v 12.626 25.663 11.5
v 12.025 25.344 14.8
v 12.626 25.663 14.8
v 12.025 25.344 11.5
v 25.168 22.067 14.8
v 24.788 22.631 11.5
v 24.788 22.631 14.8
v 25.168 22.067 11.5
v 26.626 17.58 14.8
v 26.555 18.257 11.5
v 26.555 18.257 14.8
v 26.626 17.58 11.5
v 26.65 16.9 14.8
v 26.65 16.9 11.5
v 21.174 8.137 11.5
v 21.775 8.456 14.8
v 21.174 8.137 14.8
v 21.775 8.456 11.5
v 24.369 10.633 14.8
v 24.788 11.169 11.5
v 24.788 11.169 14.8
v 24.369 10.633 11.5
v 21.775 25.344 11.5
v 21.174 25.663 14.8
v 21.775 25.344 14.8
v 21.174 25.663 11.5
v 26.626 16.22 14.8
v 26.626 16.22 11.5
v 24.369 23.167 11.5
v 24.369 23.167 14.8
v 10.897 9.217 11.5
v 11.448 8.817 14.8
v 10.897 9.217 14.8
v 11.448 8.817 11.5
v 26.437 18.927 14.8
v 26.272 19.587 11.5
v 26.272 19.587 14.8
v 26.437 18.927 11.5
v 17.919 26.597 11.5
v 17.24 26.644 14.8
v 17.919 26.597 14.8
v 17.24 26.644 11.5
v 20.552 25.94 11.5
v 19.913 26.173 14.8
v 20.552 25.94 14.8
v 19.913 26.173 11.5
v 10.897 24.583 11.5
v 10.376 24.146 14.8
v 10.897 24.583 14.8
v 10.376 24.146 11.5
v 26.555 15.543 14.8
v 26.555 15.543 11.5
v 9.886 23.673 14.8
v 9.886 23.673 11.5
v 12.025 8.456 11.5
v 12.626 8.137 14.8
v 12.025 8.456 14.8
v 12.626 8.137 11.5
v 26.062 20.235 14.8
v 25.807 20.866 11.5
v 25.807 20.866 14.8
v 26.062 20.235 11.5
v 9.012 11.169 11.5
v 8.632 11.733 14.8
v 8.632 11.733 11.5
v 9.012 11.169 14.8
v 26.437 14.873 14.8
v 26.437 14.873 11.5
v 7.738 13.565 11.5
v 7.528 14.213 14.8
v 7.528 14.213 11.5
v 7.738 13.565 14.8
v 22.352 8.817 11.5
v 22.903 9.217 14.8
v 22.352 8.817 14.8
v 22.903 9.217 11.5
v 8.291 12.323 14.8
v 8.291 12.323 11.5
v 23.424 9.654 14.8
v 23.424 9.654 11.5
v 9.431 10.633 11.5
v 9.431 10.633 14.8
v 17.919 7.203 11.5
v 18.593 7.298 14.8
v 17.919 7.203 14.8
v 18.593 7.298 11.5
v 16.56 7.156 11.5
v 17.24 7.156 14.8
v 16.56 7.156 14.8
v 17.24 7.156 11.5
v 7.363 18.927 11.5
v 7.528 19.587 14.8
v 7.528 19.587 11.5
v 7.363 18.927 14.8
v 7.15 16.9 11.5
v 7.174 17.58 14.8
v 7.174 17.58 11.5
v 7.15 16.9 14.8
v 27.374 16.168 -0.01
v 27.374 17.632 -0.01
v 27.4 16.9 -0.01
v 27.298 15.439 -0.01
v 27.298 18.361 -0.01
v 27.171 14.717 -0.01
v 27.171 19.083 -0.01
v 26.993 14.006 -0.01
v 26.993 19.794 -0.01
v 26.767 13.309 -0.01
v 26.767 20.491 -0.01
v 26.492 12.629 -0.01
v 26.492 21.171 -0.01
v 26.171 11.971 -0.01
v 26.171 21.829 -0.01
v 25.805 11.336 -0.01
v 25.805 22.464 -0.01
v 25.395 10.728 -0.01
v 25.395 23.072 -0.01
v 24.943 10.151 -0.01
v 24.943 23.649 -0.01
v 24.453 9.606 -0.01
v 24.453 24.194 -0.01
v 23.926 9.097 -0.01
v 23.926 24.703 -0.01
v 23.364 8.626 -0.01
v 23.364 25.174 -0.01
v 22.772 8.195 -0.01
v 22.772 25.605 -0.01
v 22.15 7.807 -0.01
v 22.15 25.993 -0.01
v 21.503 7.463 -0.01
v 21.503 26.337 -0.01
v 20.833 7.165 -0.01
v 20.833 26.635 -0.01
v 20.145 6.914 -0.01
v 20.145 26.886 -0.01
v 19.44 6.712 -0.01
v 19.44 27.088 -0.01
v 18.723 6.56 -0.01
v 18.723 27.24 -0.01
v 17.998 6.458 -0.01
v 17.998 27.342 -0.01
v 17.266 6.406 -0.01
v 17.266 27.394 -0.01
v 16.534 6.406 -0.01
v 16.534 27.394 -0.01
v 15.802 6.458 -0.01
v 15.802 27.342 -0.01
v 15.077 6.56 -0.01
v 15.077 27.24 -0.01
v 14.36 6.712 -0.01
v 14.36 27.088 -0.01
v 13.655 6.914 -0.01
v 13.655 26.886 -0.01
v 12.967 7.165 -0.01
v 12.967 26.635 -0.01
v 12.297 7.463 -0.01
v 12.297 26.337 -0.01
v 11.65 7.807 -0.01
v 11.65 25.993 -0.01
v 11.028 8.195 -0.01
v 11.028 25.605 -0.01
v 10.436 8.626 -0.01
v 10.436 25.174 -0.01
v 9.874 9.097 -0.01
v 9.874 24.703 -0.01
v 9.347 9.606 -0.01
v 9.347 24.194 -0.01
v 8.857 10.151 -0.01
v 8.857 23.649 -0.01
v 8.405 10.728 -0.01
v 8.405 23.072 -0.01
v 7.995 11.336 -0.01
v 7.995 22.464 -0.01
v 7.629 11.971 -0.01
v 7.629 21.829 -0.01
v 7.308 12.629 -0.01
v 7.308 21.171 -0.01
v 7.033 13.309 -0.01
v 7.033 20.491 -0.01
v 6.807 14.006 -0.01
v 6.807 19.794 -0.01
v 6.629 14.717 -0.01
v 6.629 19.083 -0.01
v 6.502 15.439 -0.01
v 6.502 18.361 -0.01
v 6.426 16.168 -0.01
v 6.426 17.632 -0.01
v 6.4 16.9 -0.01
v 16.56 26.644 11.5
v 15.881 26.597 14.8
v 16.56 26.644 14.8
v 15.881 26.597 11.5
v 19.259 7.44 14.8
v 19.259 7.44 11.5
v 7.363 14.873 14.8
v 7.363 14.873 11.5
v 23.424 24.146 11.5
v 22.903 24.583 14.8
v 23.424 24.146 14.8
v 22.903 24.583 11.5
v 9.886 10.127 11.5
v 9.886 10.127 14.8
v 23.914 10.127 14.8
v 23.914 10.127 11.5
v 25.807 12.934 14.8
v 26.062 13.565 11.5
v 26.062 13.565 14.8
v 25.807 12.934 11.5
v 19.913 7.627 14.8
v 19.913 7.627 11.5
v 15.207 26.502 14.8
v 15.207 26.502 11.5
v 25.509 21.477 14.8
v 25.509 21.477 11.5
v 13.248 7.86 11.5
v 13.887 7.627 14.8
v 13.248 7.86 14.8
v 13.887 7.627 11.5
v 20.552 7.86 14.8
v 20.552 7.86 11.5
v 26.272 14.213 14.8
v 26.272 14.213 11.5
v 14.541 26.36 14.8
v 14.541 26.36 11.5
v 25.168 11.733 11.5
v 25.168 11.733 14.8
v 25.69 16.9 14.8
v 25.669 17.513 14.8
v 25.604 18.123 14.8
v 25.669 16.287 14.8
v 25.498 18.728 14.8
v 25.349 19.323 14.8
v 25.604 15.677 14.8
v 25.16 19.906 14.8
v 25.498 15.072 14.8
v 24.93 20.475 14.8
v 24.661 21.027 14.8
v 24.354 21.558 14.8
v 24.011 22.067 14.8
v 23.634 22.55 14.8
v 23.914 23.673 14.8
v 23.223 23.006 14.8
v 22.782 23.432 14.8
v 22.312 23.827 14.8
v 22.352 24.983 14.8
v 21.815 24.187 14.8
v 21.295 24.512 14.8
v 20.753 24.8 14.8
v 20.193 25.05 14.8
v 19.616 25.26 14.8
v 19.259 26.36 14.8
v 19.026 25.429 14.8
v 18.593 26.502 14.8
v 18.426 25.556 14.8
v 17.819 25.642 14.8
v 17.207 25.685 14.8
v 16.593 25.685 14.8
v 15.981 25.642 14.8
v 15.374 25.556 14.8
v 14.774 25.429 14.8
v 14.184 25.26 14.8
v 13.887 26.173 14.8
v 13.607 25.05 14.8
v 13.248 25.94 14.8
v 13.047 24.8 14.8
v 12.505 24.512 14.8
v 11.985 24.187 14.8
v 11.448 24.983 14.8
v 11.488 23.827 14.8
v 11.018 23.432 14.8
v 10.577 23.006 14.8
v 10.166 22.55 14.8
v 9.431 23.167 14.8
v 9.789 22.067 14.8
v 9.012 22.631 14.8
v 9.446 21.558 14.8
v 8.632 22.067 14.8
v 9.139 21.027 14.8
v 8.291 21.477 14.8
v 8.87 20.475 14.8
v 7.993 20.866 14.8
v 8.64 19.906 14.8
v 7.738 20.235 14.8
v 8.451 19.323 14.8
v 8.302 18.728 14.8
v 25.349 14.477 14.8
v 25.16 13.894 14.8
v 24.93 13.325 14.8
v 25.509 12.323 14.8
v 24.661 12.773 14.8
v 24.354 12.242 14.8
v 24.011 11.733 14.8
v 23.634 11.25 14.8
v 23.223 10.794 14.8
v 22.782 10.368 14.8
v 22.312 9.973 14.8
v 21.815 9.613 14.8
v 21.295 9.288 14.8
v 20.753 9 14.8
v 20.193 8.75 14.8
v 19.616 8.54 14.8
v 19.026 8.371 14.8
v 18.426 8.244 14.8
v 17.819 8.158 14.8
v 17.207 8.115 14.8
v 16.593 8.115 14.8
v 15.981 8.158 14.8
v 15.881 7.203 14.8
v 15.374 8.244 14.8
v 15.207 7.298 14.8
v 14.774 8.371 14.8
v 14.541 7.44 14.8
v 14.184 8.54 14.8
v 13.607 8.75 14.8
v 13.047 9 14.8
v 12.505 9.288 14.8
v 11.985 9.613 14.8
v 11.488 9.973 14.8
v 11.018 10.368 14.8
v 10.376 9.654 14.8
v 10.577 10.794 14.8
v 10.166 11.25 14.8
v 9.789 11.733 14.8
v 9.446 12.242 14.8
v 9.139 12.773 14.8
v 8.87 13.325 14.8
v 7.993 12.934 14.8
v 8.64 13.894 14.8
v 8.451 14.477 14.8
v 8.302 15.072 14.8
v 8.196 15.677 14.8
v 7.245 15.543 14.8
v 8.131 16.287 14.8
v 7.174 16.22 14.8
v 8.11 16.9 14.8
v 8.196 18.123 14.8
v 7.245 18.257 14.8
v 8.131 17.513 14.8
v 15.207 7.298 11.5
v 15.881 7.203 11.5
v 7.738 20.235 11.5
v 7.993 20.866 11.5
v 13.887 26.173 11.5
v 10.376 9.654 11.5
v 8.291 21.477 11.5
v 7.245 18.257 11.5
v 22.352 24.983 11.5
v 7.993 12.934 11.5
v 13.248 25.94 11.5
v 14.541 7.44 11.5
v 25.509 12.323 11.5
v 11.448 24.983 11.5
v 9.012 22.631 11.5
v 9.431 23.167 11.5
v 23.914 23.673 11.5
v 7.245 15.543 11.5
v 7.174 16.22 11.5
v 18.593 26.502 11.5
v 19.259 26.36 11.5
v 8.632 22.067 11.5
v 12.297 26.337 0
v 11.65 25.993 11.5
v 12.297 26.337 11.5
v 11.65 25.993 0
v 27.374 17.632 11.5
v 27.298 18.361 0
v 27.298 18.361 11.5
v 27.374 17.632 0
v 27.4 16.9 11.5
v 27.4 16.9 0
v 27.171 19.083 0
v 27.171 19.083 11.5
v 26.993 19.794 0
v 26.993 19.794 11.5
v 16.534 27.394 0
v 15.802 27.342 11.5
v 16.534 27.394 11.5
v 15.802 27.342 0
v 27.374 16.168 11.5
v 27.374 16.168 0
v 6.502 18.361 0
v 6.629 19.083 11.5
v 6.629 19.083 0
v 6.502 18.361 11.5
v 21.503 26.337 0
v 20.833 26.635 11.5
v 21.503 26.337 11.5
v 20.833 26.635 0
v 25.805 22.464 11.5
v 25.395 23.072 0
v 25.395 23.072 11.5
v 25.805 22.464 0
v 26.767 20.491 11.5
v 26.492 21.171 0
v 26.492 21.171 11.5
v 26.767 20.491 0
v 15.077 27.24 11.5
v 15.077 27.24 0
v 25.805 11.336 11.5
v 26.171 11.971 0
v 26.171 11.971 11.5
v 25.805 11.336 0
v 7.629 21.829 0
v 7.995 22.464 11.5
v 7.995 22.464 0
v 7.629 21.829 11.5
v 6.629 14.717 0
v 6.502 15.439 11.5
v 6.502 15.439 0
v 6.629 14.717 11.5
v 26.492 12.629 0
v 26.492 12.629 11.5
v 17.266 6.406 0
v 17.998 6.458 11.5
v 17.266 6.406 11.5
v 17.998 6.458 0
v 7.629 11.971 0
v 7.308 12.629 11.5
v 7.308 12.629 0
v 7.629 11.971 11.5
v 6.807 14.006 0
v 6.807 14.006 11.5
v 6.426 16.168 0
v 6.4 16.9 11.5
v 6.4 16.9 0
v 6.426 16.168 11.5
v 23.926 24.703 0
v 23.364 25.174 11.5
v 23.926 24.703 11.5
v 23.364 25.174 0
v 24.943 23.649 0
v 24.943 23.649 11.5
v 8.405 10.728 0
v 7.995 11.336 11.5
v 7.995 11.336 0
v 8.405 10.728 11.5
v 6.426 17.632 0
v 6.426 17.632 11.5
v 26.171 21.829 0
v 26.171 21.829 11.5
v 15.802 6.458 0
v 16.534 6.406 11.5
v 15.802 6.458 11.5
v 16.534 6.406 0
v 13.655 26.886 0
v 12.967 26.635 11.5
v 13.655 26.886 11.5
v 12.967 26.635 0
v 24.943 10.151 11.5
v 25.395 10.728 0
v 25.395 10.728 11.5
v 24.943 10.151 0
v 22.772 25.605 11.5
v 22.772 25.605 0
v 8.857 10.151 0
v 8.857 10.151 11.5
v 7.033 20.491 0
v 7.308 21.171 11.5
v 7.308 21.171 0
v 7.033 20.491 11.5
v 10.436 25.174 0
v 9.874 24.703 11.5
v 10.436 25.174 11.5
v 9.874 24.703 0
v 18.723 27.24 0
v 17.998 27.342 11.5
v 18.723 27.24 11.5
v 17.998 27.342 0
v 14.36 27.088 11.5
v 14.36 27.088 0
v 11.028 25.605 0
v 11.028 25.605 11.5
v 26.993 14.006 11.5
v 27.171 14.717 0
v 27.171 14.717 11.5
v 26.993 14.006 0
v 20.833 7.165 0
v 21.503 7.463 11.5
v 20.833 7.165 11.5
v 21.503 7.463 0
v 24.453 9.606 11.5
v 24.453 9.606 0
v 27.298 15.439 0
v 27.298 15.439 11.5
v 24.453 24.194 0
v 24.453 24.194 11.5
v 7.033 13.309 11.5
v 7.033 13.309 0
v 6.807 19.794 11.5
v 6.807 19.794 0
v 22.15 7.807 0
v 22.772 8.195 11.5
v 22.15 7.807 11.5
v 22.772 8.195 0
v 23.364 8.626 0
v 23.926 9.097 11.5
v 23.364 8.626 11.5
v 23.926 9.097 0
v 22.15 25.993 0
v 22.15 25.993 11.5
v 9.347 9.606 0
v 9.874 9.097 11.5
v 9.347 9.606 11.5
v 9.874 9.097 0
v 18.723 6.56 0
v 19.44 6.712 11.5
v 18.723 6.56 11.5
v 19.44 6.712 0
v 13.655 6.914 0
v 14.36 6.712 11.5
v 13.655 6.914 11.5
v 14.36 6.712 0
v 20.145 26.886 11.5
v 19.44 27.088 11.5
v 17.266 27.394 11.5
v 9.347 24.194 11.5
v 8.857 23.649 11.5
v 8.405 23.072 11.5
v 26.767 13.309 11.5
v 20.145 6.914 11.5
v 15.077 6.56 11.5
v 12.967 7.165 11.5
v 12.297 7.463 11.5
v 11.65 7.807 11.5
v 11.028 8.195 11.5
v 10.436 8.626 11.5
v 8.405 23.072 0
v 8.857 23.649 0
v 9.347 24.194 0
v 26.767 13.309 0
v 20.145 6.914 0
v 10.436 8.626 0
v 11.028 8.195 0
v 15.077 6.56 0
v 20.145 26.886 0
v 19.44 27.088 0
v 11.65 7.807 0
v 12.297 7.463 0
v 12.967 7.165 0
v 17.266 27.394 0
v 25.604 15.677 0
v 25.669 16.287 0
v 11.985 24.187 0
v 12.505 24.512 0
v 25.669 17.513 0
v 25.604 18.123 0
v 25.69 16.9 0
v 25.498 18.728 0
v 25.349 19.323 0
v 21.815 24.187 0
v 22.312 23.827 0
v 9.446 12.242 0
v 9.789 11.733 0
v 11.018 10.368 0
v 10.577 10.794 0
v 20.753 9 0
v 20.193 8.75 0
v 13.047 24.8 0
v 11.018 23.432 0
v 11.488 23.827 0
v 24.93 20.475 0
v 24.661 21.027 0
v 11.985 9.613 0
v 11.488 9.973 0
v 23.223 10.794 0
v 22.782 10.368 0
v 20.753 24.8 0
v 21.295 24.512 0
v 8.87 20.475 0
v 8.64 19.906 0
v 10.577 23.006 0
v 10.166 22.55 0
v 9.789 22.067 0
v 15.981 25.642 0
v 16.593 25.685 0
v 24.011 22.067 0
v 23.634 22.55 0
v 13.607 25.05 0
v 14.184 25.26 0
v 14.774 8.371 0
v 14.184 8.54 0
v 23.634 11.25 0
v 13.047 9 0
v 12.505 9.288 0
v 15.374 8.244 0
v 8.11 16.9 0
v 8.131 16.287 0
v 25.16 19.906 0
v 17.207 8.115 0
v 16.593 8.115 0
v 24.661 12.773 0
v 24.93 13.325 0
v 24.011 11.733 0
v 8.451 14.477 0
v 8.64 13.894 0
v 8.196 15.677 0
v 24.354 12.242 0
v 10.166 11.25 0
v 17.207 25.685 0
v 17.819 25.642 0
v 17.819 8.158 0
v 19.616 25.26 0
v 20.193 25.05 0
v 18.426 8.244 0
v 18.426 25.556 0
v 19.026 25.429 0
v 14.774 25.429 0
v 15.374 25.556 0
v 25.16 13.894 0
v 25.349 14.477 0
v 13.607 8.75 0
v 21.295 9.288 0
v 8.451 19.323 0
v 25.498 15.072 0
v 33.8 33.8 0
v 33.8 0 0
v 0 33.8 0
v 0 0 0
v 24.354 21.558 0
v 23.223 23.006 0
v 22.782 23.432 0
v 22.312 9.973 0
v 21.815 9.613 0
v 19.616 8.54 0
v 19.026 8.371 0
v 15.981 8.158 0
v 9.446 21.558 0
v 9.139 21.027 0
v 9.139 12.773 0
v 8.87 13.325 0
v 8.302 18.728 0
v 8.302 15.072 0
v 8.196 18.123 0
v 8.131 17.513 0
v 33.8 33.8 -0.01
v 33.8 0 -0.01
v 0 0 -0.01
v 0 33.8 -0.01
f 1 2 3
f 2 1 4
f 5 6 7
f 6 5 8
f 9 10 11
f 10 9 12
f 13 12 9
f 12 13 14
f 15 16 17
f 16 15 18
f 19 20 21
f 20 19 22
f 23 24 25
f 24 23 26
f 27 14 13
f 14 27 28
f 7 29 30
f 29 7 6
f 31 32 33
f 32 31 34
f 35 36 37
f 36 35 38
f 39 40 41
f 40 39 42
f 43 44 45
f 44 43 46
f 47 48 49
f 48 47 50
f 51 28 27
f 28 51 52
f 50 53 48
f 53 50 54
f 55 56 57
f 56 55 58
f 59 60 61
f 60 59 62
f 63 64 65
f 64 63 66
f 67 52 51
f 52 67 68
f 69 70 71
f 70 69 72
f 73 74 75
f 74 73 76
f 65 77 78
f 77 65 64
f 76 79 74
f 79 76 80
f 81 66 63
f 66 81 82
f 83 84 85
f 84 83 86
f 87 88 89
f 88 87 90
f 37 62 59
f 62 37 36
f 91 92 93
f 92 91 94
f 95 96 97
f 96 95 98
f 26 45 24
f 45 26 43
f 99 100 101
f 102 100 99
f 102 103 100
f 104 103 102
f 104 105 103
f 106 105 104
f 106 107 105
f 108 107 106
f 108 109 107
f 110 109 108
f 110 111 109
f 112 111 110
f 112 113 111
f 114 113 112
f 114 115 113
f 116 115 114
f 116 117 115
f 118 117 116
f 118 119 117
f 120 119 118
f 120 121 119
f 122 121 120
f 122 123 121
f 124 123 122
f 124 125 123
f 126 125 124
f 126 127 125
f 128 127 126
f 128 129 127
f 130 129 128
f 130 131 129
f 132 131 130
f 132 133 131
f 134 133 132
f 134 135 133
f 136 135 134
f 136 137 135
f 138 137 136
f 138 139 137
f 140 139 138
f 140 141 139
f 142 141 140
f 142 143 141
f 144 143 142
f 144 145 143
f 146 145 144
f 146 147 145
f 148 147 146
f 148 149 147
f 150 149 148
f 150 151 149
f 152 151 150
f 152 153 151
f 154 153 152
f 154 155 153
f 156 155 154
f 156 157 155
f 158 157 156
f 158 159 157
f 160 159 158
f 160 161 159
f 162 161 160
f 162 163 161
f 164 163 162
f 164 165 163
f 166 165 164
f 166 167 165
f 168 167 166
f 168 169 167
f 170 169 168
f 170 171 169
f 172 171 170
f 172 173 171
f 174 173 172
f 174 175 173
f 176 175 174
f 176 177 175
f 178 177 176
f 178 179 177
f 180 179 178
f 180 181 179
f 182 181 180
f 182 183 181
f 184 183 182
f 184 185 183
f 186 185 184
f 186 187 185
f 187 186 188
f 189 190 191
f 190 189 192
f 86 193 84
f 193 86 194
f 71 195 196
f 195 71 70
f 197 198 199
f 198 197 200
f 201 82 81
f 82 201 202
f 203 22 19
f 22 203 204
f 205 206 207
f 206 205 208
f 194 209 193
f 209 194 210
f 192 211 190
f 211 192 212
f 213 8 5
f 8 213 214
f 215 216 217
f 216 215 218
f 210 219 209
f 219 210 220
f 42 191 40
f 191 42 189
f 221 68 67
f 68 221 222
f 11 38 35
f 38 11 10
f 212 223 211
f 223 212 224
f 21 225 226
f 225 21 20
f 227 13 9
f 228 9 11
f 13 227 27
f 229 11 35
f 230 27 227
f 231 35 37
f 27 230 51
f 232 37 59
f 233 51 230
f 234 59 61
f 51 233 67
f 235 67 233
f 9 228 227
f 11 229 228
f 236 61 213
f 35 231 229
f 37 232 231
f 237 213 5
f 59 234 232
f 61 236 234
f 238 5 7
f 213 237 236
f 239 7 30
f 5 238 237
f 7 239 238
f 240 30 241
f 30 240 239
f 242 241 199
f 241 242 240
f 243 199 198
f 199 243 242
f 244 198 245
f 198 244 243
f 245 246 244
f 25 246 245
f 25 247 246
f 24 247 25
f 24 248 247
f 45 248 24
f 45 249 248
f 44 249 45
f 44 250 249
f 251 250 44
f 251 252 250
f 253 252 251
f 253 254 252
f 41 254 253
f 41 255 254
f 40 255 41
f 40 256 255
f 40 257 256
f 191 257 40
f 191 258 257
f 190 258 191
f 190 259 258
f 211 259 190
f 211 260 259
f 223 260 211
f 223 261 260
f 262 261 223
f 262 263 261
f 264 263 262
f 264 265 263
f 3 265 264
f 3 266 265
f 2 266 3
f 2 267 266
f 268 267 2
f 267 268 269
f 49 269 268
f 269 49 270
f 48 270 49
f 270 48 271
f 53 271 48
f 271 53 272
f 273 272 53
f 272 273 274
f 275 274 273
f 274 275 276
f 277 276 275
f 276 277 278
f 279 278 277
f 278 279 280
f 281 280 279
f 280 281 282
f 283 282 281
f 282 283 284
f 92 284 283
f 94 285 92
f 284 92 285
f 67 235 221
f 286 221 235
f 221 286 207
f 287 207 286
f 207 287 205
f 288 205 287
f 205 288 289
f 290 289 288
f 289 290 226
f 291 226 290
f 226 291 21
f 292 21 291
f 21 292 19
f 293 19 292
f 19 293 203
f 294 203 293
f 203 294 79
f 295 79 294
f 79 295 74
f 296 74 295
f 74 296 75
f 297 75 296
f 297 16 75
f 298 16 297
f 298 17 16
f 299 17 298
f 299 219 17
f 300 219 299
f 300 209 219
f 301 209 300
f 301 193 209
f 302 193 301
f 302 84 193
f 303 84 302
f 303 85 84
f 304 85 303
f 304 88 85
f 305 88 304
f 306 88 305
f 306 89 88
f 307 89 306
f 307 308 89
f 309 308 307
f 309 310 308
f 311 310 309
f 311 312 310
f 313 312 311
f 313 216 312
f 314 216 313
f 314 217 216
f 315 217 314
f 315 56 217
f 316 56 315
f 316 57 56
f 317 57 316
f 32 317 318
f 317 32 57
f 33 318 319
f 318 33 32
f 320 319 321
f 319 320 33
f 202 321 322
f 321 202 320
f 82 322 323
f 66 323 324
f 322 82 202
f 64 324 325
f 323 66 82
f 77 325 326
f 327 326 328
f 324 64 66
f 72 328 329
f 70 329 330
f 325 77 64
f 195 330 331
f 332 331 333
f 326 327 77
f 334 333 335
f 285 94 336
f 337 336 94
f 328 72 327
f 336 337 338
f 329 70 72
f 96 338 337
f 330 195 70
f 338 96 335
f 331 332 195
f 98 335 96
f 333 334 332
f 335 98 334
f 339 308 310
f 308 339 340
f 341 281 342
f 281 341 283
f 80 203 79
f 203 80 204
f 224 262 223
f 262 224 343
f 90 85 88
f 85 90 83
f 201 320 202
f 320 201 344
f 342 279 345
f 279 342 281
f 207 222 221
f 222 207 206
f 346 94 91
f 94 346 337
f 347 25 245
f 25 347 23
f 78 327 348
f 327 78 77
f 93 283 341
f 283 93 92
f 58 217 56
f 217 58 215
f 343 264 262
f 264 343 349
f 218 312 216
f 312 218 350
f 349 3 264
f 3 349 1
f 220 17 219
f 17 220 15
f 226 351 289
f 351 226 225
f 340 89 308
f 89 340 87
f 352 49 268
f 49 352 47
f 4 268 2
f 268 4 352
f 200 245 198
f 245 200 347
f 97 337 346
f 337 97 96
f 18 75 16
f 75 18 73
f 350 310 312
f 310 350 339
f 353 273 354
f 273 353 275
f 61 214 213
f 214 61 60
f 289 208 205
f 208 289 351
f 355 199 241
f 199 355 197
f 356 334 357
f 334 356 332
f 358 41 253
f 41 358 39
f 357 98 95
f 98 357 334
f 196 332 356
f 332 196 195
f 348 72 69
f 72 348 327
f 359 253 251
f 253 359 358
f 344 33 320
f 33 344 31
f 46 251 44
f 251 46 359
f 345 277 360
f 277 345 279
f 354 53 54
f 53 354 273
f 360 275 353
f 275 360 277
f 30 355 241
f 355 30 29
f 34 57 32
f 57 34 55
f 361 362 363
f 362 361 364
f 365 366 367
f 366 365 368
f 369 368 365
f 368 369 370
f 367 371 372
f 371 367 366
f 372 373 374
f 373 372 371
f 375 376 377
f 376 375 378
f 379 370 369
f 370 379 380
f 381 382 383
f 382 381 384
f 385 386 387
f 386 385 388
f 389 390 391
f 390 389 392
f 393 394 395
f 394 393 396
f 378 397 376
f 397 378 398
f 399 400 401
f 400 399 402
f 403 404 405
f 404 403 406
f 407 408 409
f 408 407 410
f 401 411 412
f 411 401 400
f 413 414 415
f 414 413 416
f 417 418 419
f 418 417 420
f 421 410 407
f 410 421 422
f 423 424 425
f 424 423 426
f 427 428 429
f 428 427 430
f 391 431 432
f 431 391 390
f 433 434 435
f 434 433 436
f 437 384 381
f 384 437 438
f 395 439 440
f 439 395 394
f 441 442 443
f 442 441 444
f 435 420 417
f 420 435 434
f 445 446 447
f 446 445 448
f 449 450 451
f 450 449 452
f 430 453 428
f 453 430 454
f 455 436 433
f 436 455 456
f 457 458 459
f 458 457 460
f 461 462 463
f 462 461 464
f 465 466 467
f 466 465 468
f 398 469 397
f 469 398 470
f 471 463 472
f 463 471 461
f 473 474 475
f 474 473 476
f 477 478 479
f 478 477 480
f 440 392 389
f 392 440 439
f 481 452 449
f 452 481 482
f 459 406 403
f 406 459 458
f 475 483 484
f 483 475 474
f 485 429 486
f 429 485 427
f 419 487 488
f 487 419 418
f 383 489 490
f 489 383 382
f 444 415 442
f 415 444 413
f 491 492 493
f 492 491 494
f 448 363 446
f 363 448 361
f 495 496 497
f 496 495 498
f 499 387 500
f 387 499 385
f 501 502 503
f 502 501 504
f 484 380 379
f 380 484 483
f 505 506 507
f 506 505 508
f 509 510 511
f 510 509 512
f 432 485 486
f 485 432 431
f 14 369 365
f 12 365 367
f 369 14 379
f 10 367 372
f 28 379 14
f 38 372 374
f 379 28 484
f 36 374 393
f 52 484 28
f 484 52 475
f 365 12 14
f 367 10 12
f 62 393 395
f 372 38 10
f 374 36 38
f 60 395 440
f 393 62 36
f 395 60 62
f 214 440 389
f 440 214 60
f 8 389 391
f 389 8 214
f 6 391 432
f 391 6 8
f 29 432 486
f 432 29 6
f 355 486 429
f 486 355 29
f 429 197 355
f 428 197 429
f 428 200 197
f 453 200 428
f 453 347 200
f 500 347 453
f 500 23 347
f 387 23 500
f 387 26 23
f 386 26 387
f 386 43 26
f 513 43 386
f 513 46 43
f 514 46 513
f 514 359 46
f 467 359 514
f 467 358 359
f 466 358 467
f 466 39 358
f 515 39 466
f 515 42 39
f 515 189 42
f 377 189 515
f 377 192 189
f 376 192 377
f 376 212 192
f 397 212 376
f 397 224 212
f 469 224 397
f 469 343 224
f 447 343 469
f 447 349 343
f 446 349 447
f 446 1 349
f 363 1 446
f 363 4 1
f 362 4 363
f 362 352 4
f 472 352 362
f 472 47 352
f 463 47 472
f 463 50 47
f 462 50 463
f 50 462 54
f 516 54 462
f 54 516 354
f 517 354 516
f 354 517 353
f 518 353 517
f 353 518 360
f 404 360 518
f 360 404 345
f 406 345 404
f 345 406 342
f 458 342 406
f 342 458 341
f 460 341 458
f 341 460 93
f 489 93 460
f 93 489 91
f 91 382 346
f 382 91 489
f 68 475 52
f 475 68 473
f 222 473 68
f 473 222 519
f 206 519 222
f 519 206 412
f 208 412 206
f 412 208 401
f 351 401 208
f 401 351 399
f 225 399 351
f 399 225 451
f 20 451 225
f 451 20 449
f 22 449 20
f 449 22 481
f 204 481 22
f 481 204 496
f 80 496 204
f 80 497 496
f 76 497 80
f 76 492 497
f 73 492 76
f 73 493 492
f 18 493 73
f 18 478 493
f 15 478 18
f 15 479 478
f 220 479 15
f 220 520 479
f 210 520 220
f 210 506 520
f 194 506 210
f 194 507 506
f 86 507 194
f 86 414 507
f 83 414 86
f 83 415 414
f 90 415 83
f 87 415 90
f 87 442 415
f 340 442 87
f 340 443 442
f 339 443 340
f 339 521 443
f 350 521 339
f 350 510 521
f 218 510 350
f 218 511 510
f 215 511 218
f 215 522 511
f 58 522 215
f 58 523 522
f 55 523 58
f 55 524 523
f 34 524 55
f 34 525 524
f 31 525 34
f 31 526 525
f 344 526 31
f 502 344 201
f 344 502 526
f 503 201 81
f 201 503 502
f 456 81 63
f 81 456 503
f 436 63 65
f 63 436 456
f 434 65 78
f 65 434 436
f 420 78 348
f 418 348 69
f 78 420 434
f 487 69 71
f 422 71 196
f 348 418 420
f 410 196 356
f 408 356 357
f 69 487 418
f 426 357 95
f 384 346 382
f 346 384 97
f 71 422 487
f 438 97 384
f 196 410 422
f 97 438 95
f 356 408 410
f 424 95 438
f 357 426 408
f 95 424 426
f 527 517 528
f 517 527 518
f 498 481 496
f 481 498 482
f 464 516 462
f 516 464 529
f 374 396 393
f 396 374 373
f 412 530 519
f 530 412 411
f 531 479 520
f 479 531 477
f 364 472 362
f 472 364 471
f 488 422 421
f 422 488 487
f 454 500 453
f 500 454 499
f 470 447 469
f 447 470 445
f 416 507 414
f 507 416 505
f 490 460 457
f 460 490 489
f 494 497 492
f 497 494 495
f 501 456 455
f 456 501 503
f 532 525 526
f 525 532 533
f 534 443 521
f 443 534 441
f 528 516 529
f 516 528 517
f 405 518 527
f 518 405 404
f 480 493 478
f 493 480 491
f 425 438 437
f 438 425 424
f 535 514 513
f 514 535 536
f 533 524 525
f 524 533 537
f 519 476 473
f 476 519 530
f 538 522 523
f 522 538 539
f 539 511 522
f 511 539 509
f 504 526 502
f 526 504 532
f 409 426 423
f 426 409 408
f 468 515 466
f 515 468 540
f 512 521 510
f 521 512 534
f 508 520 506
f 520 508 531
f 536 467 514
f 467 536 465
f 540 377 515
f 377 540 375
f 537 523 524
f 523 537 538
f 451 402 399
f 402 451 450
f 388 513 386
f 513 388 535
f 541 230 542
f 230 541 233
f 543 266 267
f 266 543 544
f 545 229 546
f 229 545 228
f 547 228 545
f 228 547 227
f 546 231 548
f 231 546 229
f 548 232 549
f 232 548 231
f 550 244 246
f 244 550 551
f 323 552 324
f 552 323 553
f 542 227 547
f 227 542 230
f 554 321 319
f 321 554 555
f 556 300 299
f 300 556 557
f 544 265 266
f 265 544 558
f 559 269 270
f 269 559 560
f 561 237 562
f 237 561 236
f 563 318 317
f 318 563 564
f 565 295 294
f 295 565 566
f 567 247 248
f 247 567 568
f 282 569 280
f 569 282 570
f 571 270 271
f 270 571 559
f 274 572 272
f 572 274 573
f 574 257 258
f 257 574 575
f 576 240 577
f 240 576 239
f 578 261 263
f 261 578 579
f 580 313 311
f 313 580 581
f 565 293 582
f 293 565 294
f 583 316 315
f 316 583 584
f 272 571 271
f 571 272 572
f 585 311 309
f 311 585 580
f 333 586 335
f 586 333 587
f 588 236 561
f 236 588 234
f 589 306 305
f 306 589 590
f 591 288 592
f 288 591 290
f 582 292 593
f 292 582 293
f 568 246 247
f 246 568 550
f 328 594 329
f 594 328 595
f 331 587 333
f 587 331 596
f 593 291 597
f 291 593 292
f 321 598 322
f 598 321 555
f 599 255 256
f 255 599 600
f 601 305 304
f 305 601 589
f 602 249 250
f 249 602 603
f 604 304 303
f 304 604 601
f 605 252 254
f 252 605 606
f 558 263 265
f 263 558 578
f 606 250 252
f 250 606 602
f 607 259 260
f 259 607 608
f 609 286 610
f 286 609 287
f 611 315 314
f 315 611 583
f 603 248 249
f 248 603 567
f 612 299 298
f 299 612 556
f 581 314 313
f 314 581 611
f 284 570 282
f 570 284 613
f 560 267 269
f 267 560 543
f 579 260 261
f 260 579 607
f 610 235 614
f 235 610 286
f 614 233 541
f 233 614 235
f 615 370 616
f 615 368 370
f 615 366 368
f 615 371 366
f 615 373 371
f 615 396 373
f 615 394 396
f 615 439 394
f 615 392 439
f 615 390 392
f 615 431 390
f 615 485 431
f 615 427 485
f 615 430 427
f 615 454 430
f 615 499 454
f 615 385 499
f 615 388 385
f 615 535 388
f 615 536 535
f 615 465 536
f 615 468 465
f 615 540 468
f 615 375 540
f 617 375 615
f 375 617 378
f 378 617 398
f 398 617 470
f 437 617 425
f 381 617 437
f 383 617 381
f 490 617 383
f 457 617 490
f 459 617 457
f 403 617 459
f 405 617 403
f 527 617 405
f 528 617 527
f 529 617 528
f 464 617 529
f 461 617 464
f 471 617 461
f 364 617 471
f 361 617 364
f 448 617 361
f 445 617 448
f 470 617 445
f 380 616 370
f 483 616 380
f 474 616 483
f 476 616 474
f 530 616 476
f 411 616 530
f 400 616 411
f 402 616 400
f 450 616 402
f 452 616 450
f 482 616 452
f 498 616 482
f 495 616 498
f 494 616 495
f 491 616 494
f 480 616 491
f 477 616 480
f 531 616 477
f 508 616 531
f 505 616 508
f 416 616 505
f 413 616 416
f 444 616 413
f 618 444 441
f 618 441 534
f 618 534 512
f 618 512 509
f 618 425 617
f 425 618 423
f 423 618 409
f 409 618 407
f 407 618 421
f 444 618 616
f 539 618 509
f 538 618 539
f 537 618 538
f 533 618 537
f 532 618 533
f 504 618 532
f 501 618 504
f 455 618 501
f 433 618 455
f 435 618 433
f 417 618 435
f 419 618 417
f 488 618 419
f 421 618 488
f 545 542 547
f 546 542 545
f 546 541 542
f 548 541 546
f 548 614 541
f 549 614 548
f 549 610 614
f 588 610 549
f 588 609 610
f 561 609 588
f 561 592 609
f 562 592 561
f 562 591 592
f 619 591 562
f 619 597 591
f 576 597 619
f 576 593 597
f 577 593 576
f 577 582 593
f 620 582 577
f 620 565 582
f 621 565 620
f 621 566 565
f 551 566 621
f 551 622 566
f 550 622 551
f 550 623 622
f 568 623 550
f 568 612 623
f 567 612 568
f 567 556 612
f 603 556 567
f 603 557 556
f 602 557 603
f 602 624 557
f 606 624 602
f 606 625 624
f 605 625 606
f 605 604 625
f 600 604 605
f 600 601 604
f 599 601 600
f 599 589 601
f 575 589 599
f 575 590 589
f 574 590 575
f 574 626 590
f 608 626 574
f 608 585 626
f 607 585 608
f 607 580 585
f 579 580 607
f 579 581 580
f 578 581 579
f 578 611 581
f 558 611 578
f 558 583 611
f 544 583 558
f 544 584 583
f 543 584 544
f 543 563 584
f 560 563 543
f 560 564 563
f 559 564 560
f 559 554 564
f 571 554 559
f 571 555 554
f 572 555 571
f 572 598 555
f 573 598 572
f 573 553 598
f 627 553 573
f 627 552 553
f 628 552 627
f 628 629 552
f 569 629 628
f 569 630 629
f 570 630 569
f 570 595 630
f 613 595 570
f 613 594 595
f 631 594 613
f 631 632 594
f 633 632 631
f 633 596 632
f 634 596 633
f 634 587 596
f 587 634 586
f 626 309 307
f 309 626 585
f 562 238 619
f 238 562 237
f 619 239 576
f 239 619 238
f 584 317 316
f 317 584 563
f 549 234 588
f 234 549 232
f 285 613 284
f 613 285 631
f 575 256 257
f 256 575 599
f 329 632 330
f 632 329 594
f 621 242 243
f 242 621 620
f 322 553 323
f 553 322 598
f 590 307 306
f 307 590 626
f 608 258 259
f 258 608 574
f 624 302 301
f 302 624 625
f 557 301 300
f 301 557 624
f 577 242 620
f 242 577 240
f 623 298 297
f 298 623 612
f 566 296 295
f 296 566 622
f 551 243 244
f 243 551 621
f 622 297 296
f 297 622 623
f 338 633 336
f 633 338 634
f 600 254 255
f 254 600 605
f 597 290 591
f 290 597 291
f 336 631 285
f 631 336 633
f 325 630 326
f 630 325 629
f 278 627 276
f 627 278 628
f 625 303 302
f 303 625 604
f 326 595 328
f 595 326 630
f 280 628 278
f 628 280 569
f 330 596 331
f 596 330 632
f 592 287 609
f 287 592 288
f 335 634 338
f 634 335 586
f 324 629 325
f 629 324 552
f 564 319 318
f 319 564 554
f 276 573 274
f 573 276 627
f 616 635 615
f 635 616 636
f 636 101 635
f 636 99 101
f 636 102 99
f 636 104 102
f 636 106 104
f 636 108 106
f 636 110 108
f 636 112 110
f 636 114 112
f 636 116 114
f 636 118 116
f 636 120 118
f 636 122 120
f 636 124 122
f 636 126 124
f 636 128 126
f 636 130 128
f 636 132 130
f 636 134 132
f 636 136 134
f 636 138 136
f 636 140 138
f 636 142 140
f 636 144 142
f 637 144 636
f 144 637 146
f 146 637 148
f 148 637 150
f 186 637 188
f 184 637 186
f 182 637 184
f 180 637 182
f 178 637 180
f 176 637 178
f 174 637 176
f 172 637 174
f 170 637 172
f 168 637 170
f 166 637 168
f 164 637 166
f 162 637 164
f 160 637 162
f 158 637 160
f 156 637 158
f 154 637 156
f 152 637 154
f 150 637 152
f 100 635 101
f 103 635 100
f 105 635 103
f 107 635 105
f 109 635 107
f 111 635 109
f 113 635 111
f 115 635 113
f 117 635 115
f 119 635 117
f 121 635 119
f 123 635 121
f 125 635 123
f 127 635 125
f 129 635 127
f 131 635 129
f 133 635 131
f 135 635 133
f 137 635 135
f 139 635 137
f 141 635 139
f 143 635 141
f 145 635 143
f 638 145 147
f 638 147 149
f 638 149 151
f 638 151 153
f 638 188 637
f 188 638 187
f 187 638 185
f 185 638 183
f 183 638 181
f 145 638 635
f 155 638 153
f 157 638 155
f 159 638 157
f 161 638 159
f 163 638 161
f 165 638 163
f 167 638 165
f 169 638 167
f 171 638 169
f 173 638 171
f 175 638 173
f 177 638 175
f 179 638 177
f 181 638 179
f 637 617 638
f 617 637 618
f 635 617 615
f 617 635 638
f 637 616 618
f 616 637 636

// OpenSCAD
// file: ../Base/PlacementOptions.scad
// Fischertechnik Box Foundation
// Placement Options

// Alignment
NoAlign = 0;
AlignLeft = 1;
AlignBottom = 2;
AlignCenter = 3;
AlignRight = 4;
AlignTop = 5;

// Element rotation degree steps
rotations = [0, -90, -180, -270];

// Rotation
NoRotation = 0;
Rotate0 = 0;
Rotate90 = 1;
Rotate180 = 2;
Rotate270 = 3;

// Docking (seen from above)
NoDock = -1;
DockLeft = 0;
DockTop = 1;
DockRight = 2;
DockCorner = 2;
DockBottom = 3;

// Web corners
LowerLeft = 0;
UpperLeft = 1;
UpperRight = 2;
LowerRight = 3;

// Web position relative to corner
LeftOfCorner = 0;
RightOfCorner = 1;
// file: ../Base/Boxes.scad
// Fischertechnik Box Foundation
// Pre-designed Boxes

use <Constants.scad>

include <PlacementOptions.scad>

box190Width = 190;
box190Depth = 130;
box130Width = 130;
box130Depth = 95;
boxUsageHeight = 33.9;
boxWallThickness = 2.4;
boxBaseThickness = 1.0;

// getBoxWallThickness()
// Gets the wall thickness of a Fischertechnik Box

function getBoxWallThickness() = boxWallThickness;

// Gets the usable height of a fischertechnik box
function getBoxUsageHeight() = boxUsageHeight;

// Gets the thickness of the Fischertechnik box base.
function getBoxBaseThickness() = boxBaseThickness;

// Gets the usable inner space of a Box 190 as an x/y-list
function getBox190Space() = [
    box190Width - 2*getBoxWallThickness(), 
    box190Depth - 2*getBoxWallThickness() ];

// Imports the Fischertechnik empty box 130x190 mm and places it at position 0,0
// 190x130 are the outer sizes, the inner space is slightly smaller. Use getBox190Space() to get the inner sizes.
// This module needs the STL file "Fischertechnik Box 130x190.stl" in the library path.
// The box is positioned that the usable inner space is at the 0,0,0 position. The

module Box190() {
    translate([-getBoxWallThickness(),-getBoxWallThickness(),-getBoxBaseThickness()])
        import("Fischertechnik Box 130x190.stl", convexity=3);
}

// Gets the usable inner space of a Box 130 as an x/y-list
function getBox130Space() = [
    box130Width - 2*getBoxWallThickness(), 
    box130Depth - 2*getBoxWallThickness() ];

// Imports the Fischertechnik empty box 95x130 mm and places it at position 0,0
// 190x130 are the outer sizes, the inner space is slightly smaller. Use getBox190Space() to get the inner sizes.
// This module needs the STL file "Fischertechnik Box 95x130.stl" in the library path.
// The box is positioned that the usable inner space is at the 0,0,0 position. The

module Box130() {
    translate([-getBoxWallThickness(),-getBoxWallThickness(),-getBoxBaseThickness()])
        import("Fischertechnik Box 95x130.stl", convexity=3);
}

// Creates a web at the specified box walls
// corner 0 = LowerLeft, 1 = UpperLeft, 2 = UpperRight, 3 = LowerRight
// side 0 = LeftOfCorner, 1 = RightOfCorner
// distance = Distance in mm from the corner
// box = inner width and depth of the box (default: Box 190)
// webWidth = length of the web (default is 3 mms)
// webThickness = thickness of the web (default is 1 mm)

module BoxWeb(corner, side, distance, box=getBox190Space(), webWidth=3, webThickness=1.0) {
    sink = getBoxWallThickness()/2;

    width = (corner % 2 == 0) ? 
            (side == LeftOfCorner ? webWidth : webThickness) :
            (side == LeftOfCorner ? webThickness : webWidth);

    depth = (corner % 2 == 0) ? 
            (side == RightOfCorner ? webWidth : webThickness) :
            (side == RightOfCorner ? webThickness : webWidth);
    
    xDiff = corner == LowerLeft ? 
                (side == LeftOfCorner ? -sink : distance) :
            (corner == UpperLeft ?                
                (side == LeftOfCorner ? distance : -sink) :
            (corner == UpperRight ?
                (side == LeftOfCorner ? box.x-webWidth+sink : box.x-distance-webThickness) :
                (side == LeftOfCorner ? box.x-distance-webThickness: box.x-webWidth+sink)));

    yDiff = corner == LowerLeft ? 
                (side == RightOfCorner ? -sink : distance) :
            (corner == UpperLeft ?
                (side == RightOfCorner ? box.y-distance : box.y-webWidth+sink) :
            (corner == UpperRight ?
                (side == RightOfCorner ? box.y-webWidth+sink : box.y-distance) :
                (side == RightOfCorner ? distance : -sink)));
    
    translate([xDiff, yDiff, -getExcess()])
        cube([width, depth, boxUsageHeight + 2*getExcess()]);
}
// file: ../Base/Rotation.scad
// Fischertechnik Box Foundation
// Geometry Helpers Rotation

include <PlacementOptions.scad>

// getRotatedSpace(space, rotation=NoRotation)
// Rotates the space dependent on the specified rotation

function getRotatedSpace(space, rotation=NoRotation) = [
    (rotation == Rotate90 || rotation == Rotate270) ? space.y : space.x,
    (rotation == Rotate90 || rotation == Rotate270) ? space.x : space.y
];

// Rotates the given space around the fixed left lower corner
// space = the space the children needs as width/depth list [width,depth]
// rotation = 0 Rotate0 degrees, 1 Rotate90 degrees, 2 Rotate180 degrees, 3 Rotate270 degrees (equivalent to -90)

module RotateFix(space, rotation=Rotate0) {
    dy = (rotation == Rotate0 || rotation == Rotate270) ? 0 :
        (rotation == Rotate90) ? space.x :
        space.y;
    dx = (rotation < Rotate180) ? 0 :
        (rotation == Rotate180) ? space.x :
        space.y;
    
    translate([dx, dy, 0])
        rotate([0, 0, rotations[rotation]])
            children();
}
// file: ../Base/Alignment.scad
// Fischertechnik Box Foundation
// Geometry Helpers Alignment

include <PlacementOptions.scad>

// getAlignedX(elementWidth, spaceWidth, align=AlignRight, offset=0)
// Gets the aligned X offset of an element with the given
// width in the given space.
// elementWidth = The width of the element to positon
// spaceWidth = The space where the element should be aligned
// align = 0 AlignLeft, 1 AlignCenter, 2 AlignRight
// offset = an optional offset from the aligned position. When
// aligned left or centered, then positive values are in X direction.
// When aligned right then positive values are in negative X direction.

function getAlignedX(elementWidth, spaceWidth, align=AlignRight, offset=0) =
    (align == AlignLeft) ?
        offset :
        ((align == AlignCenter) ?
        (spaceWidth - elementWidth)/2 + offset :
        spaceWidth - offset - elementWidth);

// getAlignedY(elementDepth, spaceDepth, align=AlignTop, offset=0)
// Gets the aligned Y offset of an element with the given
// depth in the given space.
// elementDepth = The depth of the element to positon
// spaceDepth = The space where the element should be aligned
// align = 0 AlignBottom, 1 AlignCenter, 2 AlignTop
// offset = an optional offset from the aligned position. When
// aligned bottom or centered, then positive values are in Y direction.
// When aligned top then positive values are in negative Y direction.

function getAlignedY(elementDepth, spaceDepth, align=AlignTop, offset=0) =
    (align == AlignBottom) ?
        offset :
        ((align == AlignCenter) ?
        (spaceDepth - elementDepth)/2 + offset :
        spaceDepth - offset - elementDepth);
// file: ../Base/Placement.scad
// Fischertechnik Box Foundation
// Geometry Helpers Placement

use <Constants.scad>
use <Alignment.scad>
use <Rotation.scad>
use <Boxes.scad>

include <PlacementOptions.scad>

// Place(x=0, y=0, elementSpace=[0,0], alignX=AlignLeft, alignY=AlignBottom, rotation=Rotate0, boxSpace=getBox190Space())
// Places the child at the specified position
// y = Y-Position. This is a relative position when an X aligment is specified.
// x = X-Position. This is a relative position when an Y aligment is specified.
// elementSpace = space of the element to be placed [x,y]
// alignX = -1=NoAlign, 0 AlignLeft, 1 AlignCenter, 3 AlignRight (elementSpace and boxSpace required!)
// alignY = -1=NoAlign, 2 AlignBottom, 1 AlignCenter, 4 AlignTop (elementSpace and boxSpace required!)
// rotation = 0 Rotate0 0 degrees, 1 Rotate90 90 degrees, 
// 2 Rotate180 180 degrees, 3 Rotate270 270 degrees (equivalent to -90)
// boxSpace = Inner space of the box where the placement occurs [x,y] - default is Box 190x130 inner space

module Place(x=0, y=0, elementSpace=[0,0], 
  alignX=AlignLeft, alignY=AlignBottom, 
  rotation=NoRotation, boxSpace=getBox190Space()) {

    module Position(x, y, space, rotation=Rotate0) {
        translate([x, y, 0])
            RotateFix(space, rotation)
                children(0);
    }

    space = getRotatedSpace(elementSpace, rotation);
    alignedX = getAlignedX(space.x, boxSpace.x, alignX, x);
    alignedY = getAlignedY(space.y, boxSpace.y, alignY, y);
    Position(alignedX, alignedY, elementSpace, rotation)
        children(0);
}

// Center(space=getBox130Space(), elementSpace=[0,0])
// space = Space where the children is centered. For cylinder use centered=true and no elementSpace.
// elementSpace = space of the element to be centered [x,y]

module Center(space=getBox190Space(), elementSpace=[0,0]) {
    translate([(space.x - elementSpace.x) / 2, (space.y - elementSpace.y) / 2])
        children(0);
}

// CenterHorizontal(width=0, y=0, offset=0, space=getBox130Space())
// space = Space where the children is centered. For cylinder use centered=true and no elementSpace.
// elementSpace = space of the element to be centered [x,y]

module CenterHorizontal(width=0, y=0, offset=0, space=getBox190Space()) {
    translate([(space.x - width) / 2 + offset, y])
        children(0);
}

// CenterVertical(depth=0, x=0, offset=0, space=getBox130Space())
// space = Space where the children is centered. For cylinder use centered=true and no elementSpace.
// elementSpace = space of the element to be centered [x,y]

module CenterVerticalal(depth=0, x=0, offset=0, space=getBox190Space()) {
    translate([x, (space.y - depth) / 2 + offset])
        children(0);
}
// file: ../Base/Constants.scad
// Fischertechnik Box Foundation
// Constants

// Constant values necessary for multiple elements

// Base constants
dividerThickness = 1.2;
excess = 0.01;
fragments = 90;
tolerance = 0.8;

// Gets the thickness of a divider 
function getDividerThickness() = dividerThickness;

// Gets the excess that is used to merge walls into each other
function getExcess() = excess;

// Gets amount of fragments of a cylinder
function getFragments() = fragments;

// Gets the inner tolerance of a frame to each side
function getTolerance() = tolerance;


// Fischertechnik specific constants
axisDiameter = 4;
axisBottomDiameter = axisDiameter + 1;
standardEdgeDistance = 2.5;
standardWebDistance = 11.5;
standardCornerLength = 15;
tubeWallFactor = 1.6;

// Gets axis diameter
function getAxisDiameter() = axisDiameter;

// Gets axis bottom diameter for thicker part at the bottom
function getAxisBottomDiameter() = axisBottomDiameter;

// gets the standard distance to the wall of the box for dockable frames with webs
function getStandardEdgeDistance() = standardEdgeDistance;

// gets the standard distance of each web to the corner of the dockable frame
function getStandardWebDistance() = standardWebDistance;

// gets the standard length of the corner walls of a dockable frame
function getStandardCornerLength() = standardCornerLength;

// gets the wall thickness of a tube.
function getTubeWallThickness() = tubeWallFactor * getDividerThickness();
// main file
// Fischertechnik Box Library
// Cylinder for Gear or Tire
// 31021

use <../Base/Constants.scad>
use <../Base/Placement.scad>
use <../ModelBase/Simple.scad>

depth = 33.8;
width = 33.8;
height = 14.8;
levelHeight = 11.5;

function getCylinderGearHeight() = height;
function getCylinderGearLevelHeight() = levelHeight;

// getCylinderGearSpace()
// Gets the space the cylinder gear needs as width and depth (.x and .y as a list)

function getCylinderGearSpace() = [width, depth];

// CylinderGear()
// Standing cylinder for gear wheel Z20 or disc-cam

module CylinderGear() {
    diameter = 19.5;
    levelDiameter = 21;

    Space(getCylinderGearSpace());
        
    Center(getCylinderGearSpace())
        LeveledTube(getCylinderGearHeight(), diameter, getCylinderGearLevelHeight(), levelDiameter);
}

// Tests
color("lightgray")
CylinderGear();
